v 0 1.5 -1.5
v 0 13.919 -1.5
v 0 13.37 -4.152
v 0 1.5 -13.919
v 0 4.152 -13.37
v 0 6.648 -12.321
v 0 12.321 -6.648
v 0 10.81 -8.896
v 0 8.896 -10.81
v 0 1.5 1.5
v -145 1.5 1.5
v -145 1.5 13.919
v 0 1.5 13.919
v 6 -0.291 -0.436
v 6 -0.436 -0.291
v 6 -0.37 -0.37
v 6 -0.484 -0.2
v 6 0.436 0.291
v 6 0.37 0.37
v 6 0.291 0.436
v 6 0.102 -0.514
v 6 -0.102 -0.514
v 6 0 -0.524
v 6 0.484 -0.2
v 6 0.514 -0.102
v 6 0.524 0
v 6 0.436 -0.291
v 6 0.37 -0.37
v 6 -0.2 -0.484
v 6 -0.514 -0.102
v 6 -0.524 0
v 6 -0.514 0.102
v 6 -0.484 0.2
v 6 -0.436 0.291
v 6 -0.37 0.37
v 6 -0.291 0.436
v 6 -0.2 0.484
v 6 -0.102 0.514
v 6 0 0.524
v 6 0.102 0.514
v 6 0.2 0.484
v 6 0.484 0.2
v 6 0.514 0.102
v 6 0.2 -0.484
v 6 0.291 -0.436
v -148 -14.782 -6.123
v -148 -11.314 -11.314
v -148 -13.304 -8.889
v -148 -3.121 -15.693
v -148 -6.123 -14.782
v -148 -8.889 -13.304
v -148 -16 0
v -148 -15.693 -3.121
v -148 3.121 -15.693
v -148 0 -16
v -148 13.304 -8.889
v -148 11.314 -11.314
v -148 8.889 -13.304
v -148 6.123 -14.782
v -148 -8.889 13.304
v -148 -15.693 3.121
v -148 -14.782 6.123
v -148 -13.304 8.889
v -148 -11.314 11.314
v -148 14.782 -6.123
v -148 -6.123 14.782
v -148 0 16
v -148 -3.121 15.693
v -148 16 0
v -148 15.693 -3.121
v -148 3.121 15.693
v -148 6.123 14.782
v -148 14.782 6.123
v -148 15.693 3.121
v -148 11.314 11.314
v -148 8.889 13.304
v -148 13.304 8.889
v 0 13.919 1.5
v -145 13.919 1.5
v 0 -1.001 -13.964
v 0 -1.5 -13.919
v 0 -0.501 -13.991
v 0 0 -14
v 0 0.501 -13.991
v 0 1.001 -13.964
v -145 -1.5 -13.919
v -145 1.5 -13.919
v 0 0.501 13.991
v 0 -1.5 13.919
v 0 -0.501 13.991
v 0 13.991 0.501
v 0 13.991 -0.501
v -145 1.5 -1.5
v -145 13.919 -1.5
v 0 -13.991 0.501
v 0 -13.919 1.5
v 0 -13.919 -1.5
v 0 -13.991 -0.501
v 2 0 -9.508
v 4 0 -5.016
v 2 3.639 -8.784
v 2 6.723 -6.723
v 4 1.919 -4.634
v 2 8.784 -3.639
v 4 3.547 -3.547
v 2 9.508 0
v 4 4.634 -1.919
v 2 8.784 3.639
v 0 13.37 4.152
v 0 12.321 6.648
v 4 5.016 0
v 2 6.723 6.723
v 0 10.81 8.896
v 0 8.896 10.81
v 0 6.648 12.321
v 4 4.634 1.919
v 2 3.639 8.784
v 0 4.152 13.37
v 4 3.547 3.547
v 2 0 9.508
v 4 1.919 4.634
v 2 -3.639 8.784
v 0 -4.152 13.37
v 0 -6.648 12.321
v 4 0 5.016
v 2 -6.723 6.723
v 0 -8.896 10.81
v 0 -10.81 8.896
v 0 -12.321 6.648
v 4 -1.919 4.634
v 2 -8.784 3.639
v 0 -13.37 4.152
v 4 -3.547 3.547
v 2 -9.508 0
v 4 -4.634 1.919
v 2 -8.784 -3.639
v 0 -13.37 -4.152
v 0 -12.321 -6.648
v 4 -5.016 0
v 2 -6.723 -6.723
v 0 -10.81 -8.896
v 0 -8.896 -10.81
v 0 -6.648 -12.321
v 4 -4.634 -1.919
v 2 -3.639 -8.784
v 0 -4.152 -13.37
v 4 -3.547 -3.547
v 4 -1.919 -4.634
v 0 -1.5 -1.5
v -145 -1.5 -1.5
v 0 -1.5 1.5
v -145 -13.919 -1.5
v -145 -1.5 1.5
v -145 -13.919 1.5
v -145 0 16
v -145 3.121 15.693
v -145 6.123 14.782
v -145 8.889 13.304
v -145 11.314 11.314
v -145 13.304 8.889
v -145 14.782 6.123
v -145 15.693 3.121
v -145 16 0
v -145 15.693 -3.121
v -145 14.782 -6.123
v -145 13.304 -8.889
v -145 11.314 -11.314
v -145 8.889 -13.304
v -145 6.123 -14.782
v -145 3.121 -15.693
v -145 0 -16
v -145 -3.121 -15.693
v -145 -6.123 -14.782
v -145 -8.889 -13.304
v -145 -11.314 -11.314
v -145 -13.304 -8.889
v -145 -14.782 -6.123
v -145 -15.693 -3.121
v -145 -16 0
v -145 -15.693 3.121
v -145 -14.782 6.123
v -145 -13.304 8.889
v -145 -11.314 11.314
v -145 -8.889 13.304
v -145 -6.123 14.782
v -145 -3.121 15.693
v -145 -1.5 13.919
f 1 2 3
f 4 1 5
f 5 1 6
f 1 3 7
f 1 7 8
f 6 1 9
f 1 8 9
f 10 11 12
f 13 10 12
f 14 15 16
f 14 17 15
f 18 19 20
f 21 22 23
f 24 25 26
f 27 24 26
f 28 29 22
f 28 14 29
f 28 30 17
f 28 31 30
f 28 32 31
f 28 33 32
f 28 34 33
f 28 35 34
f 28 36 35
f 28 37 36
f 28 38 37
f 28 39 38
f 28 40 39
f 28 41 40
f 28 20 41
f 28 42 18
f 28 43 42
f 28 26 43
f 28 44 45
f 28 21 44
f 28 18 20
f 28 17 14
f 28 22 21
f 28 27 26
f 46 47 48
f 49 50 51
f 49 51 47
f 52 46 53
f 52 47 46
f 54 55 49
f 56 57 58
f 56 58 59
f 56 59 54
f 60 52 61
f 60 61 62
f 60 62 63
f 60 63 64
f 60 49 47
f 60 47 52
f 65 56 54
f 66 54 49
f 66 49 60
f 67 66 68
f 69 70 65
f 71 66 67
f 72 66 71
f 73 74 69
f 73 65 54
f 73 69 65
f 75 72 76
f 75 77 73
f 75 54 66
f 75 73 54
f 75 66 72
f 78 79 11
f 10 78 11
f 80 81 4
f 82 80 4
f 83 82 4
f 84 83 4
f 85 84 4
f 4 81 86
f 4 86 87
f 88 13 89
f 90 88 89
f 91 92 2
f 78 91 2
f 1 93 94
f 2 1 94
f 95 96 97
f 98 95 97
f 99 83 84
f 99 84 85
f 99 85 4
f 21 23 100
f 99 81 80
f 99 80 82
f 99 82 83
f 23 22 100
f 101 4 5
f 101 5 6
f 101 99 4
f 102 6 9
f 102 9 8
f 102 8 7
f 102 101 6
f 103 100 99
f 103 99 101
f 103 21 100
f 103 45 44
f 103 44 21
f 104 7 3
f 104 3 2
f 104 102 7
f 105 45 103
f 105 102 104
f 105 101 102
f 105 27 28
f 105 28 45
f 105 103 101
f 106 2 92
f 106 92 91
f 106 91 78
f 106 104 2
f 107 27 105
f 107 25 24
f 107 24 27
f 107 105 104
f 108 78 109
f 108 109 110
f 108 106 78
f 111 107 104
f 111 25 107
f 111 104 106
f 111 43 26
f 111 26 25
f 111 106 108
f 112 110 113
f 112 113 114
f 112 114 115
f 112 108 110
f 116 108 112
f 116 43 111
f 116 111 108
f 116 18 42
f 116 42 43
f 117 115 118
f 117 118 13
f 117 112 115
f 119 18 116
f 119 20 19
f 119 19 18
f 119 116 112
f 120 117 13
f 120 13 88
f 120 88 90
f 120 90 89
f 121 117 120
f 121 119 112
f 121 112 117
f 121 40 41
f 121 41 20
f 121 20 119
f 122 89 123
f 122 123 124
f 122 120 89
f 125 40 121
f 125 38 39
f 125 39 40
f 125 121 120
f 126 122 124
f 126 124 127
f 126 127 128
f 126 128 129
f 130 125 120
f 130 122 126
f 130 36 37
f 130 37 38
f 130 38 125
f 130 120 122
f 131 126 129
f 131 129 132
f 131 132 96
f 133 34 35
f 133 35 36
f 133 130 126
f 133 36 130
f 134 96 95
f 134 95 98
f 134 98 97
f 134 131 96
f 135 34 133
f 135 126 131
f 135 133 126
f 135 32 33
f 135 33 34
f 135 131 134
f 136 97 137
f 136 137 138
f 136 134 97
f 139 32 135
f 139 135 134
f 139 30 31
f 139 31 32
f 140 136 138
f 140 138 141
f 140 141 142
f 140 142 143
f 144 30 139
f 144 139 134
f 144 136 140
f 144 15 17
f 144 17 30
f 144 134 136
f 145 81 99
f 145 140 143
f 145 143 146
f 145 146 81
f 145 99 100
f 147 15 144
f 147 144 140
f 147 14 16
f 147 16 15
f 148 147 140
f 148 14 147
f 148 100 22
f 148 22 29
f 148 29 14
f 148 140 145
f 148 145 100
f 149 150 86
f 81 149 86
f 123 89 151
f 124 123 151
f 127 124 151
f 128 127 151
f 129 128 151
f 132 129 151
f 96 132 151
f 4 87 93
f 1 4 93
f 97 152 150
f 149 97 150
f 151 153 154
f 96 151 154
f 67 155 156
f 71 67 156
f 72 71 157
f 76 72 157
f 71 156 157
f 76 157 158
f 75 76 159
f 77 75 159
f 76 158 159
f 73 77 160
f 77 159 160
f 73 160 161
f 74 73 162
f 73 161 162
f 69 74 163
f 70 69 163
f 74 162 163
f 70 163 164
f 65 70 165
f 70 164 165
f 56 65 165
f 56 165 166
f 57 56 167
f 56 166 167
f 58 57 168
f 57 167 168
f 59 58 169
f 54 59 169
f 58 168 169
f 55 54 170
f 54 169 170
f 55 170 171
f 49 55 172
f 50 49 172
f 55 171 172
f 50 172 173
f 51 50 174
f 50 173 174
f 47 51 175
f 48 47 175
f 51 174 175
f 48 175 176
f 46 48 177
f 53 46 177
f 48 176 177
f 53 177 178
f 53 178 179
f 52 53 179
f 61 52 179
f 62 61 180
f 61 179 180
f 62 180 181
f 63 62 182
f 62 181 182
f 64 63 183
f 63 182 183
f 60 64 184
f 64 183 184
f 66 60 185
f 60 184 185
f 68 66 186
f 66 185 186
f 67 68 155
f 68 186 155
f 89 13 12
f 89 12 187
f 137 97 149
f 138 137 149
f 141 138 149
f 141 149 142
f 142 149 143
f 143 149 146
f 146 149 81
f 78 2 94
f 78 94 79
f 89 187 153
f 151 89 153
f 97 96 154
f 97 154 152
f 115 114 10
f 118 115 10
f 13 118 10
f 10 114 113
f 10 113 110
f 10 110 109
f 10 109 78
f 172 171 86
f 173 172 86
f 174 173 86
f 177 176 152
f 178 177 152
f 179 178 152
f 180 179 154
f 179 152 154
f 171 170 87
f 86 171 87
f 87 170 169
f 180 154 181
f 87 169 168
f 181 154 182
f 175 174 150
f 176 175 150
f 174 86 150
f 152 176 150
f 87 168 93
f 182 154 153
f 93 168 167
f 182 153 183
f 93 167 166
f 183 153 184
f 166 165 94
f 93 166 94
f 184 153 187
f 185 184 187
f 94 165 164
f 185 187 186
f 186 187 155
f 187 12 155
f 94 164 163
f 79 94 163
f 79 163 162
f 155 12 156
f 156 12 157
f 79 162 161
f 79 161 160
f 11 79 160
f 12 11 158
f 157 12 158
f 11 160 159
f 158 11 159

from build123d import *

# Parameters (mm, degrees)
SKETCH1_R           = 14
BOSS_EXTRUDE1_DEPTH = 6
BOSS_EXTRUDE1_TAPER = 66
BOSS_EXTRUDE2_DEPTH = 145
SKETCH3_R           = 16
BOSS_EXTRUDE3_DEPTH = 3


with BuildPart() as part:
    # Sketch1 → Boss-Extrude1 (new body)
    with BuildSketch(Plane(origin=(0, 0, 0), x_dir=(0, 0, -1), z_dir=(1, 0, 0))):
        Circle(SKETCH1_R)
    extrude(amount=BOSS_EXTRUDE1_DEPTH, taper=BOSS_EXTRUDE1_TAPER)

    # Sketch2 → Boss-Extrude2 (add)
    with BuildSketch(Plane.ZY):
        Polygon((1.5, -1.5), (1.5, -13.919410907), (-1.5, -13.919410907), (-1.5, -1.5), (-13.919410907, -1.5), (-13.919410907, 1.5), (-1.5, 1.5), (-1.5, 13.919410907), (1.5, 13.919410907), (1.5, 1.5), (13.919410907, 1.5), (13.919410907, -1.5), align=None)
    extrude(amount=BOSS_EXTRUDE2_DEPTH)

    # Sketch3 → Boss-Extrude3 (add)
    with BuildSketch(Plane.ZY.offset(145)):
        Circle(SKETCH3_R)
    extrude(amount=BOSS_EXTRUDE3_DEPTH)


solid = part.part
